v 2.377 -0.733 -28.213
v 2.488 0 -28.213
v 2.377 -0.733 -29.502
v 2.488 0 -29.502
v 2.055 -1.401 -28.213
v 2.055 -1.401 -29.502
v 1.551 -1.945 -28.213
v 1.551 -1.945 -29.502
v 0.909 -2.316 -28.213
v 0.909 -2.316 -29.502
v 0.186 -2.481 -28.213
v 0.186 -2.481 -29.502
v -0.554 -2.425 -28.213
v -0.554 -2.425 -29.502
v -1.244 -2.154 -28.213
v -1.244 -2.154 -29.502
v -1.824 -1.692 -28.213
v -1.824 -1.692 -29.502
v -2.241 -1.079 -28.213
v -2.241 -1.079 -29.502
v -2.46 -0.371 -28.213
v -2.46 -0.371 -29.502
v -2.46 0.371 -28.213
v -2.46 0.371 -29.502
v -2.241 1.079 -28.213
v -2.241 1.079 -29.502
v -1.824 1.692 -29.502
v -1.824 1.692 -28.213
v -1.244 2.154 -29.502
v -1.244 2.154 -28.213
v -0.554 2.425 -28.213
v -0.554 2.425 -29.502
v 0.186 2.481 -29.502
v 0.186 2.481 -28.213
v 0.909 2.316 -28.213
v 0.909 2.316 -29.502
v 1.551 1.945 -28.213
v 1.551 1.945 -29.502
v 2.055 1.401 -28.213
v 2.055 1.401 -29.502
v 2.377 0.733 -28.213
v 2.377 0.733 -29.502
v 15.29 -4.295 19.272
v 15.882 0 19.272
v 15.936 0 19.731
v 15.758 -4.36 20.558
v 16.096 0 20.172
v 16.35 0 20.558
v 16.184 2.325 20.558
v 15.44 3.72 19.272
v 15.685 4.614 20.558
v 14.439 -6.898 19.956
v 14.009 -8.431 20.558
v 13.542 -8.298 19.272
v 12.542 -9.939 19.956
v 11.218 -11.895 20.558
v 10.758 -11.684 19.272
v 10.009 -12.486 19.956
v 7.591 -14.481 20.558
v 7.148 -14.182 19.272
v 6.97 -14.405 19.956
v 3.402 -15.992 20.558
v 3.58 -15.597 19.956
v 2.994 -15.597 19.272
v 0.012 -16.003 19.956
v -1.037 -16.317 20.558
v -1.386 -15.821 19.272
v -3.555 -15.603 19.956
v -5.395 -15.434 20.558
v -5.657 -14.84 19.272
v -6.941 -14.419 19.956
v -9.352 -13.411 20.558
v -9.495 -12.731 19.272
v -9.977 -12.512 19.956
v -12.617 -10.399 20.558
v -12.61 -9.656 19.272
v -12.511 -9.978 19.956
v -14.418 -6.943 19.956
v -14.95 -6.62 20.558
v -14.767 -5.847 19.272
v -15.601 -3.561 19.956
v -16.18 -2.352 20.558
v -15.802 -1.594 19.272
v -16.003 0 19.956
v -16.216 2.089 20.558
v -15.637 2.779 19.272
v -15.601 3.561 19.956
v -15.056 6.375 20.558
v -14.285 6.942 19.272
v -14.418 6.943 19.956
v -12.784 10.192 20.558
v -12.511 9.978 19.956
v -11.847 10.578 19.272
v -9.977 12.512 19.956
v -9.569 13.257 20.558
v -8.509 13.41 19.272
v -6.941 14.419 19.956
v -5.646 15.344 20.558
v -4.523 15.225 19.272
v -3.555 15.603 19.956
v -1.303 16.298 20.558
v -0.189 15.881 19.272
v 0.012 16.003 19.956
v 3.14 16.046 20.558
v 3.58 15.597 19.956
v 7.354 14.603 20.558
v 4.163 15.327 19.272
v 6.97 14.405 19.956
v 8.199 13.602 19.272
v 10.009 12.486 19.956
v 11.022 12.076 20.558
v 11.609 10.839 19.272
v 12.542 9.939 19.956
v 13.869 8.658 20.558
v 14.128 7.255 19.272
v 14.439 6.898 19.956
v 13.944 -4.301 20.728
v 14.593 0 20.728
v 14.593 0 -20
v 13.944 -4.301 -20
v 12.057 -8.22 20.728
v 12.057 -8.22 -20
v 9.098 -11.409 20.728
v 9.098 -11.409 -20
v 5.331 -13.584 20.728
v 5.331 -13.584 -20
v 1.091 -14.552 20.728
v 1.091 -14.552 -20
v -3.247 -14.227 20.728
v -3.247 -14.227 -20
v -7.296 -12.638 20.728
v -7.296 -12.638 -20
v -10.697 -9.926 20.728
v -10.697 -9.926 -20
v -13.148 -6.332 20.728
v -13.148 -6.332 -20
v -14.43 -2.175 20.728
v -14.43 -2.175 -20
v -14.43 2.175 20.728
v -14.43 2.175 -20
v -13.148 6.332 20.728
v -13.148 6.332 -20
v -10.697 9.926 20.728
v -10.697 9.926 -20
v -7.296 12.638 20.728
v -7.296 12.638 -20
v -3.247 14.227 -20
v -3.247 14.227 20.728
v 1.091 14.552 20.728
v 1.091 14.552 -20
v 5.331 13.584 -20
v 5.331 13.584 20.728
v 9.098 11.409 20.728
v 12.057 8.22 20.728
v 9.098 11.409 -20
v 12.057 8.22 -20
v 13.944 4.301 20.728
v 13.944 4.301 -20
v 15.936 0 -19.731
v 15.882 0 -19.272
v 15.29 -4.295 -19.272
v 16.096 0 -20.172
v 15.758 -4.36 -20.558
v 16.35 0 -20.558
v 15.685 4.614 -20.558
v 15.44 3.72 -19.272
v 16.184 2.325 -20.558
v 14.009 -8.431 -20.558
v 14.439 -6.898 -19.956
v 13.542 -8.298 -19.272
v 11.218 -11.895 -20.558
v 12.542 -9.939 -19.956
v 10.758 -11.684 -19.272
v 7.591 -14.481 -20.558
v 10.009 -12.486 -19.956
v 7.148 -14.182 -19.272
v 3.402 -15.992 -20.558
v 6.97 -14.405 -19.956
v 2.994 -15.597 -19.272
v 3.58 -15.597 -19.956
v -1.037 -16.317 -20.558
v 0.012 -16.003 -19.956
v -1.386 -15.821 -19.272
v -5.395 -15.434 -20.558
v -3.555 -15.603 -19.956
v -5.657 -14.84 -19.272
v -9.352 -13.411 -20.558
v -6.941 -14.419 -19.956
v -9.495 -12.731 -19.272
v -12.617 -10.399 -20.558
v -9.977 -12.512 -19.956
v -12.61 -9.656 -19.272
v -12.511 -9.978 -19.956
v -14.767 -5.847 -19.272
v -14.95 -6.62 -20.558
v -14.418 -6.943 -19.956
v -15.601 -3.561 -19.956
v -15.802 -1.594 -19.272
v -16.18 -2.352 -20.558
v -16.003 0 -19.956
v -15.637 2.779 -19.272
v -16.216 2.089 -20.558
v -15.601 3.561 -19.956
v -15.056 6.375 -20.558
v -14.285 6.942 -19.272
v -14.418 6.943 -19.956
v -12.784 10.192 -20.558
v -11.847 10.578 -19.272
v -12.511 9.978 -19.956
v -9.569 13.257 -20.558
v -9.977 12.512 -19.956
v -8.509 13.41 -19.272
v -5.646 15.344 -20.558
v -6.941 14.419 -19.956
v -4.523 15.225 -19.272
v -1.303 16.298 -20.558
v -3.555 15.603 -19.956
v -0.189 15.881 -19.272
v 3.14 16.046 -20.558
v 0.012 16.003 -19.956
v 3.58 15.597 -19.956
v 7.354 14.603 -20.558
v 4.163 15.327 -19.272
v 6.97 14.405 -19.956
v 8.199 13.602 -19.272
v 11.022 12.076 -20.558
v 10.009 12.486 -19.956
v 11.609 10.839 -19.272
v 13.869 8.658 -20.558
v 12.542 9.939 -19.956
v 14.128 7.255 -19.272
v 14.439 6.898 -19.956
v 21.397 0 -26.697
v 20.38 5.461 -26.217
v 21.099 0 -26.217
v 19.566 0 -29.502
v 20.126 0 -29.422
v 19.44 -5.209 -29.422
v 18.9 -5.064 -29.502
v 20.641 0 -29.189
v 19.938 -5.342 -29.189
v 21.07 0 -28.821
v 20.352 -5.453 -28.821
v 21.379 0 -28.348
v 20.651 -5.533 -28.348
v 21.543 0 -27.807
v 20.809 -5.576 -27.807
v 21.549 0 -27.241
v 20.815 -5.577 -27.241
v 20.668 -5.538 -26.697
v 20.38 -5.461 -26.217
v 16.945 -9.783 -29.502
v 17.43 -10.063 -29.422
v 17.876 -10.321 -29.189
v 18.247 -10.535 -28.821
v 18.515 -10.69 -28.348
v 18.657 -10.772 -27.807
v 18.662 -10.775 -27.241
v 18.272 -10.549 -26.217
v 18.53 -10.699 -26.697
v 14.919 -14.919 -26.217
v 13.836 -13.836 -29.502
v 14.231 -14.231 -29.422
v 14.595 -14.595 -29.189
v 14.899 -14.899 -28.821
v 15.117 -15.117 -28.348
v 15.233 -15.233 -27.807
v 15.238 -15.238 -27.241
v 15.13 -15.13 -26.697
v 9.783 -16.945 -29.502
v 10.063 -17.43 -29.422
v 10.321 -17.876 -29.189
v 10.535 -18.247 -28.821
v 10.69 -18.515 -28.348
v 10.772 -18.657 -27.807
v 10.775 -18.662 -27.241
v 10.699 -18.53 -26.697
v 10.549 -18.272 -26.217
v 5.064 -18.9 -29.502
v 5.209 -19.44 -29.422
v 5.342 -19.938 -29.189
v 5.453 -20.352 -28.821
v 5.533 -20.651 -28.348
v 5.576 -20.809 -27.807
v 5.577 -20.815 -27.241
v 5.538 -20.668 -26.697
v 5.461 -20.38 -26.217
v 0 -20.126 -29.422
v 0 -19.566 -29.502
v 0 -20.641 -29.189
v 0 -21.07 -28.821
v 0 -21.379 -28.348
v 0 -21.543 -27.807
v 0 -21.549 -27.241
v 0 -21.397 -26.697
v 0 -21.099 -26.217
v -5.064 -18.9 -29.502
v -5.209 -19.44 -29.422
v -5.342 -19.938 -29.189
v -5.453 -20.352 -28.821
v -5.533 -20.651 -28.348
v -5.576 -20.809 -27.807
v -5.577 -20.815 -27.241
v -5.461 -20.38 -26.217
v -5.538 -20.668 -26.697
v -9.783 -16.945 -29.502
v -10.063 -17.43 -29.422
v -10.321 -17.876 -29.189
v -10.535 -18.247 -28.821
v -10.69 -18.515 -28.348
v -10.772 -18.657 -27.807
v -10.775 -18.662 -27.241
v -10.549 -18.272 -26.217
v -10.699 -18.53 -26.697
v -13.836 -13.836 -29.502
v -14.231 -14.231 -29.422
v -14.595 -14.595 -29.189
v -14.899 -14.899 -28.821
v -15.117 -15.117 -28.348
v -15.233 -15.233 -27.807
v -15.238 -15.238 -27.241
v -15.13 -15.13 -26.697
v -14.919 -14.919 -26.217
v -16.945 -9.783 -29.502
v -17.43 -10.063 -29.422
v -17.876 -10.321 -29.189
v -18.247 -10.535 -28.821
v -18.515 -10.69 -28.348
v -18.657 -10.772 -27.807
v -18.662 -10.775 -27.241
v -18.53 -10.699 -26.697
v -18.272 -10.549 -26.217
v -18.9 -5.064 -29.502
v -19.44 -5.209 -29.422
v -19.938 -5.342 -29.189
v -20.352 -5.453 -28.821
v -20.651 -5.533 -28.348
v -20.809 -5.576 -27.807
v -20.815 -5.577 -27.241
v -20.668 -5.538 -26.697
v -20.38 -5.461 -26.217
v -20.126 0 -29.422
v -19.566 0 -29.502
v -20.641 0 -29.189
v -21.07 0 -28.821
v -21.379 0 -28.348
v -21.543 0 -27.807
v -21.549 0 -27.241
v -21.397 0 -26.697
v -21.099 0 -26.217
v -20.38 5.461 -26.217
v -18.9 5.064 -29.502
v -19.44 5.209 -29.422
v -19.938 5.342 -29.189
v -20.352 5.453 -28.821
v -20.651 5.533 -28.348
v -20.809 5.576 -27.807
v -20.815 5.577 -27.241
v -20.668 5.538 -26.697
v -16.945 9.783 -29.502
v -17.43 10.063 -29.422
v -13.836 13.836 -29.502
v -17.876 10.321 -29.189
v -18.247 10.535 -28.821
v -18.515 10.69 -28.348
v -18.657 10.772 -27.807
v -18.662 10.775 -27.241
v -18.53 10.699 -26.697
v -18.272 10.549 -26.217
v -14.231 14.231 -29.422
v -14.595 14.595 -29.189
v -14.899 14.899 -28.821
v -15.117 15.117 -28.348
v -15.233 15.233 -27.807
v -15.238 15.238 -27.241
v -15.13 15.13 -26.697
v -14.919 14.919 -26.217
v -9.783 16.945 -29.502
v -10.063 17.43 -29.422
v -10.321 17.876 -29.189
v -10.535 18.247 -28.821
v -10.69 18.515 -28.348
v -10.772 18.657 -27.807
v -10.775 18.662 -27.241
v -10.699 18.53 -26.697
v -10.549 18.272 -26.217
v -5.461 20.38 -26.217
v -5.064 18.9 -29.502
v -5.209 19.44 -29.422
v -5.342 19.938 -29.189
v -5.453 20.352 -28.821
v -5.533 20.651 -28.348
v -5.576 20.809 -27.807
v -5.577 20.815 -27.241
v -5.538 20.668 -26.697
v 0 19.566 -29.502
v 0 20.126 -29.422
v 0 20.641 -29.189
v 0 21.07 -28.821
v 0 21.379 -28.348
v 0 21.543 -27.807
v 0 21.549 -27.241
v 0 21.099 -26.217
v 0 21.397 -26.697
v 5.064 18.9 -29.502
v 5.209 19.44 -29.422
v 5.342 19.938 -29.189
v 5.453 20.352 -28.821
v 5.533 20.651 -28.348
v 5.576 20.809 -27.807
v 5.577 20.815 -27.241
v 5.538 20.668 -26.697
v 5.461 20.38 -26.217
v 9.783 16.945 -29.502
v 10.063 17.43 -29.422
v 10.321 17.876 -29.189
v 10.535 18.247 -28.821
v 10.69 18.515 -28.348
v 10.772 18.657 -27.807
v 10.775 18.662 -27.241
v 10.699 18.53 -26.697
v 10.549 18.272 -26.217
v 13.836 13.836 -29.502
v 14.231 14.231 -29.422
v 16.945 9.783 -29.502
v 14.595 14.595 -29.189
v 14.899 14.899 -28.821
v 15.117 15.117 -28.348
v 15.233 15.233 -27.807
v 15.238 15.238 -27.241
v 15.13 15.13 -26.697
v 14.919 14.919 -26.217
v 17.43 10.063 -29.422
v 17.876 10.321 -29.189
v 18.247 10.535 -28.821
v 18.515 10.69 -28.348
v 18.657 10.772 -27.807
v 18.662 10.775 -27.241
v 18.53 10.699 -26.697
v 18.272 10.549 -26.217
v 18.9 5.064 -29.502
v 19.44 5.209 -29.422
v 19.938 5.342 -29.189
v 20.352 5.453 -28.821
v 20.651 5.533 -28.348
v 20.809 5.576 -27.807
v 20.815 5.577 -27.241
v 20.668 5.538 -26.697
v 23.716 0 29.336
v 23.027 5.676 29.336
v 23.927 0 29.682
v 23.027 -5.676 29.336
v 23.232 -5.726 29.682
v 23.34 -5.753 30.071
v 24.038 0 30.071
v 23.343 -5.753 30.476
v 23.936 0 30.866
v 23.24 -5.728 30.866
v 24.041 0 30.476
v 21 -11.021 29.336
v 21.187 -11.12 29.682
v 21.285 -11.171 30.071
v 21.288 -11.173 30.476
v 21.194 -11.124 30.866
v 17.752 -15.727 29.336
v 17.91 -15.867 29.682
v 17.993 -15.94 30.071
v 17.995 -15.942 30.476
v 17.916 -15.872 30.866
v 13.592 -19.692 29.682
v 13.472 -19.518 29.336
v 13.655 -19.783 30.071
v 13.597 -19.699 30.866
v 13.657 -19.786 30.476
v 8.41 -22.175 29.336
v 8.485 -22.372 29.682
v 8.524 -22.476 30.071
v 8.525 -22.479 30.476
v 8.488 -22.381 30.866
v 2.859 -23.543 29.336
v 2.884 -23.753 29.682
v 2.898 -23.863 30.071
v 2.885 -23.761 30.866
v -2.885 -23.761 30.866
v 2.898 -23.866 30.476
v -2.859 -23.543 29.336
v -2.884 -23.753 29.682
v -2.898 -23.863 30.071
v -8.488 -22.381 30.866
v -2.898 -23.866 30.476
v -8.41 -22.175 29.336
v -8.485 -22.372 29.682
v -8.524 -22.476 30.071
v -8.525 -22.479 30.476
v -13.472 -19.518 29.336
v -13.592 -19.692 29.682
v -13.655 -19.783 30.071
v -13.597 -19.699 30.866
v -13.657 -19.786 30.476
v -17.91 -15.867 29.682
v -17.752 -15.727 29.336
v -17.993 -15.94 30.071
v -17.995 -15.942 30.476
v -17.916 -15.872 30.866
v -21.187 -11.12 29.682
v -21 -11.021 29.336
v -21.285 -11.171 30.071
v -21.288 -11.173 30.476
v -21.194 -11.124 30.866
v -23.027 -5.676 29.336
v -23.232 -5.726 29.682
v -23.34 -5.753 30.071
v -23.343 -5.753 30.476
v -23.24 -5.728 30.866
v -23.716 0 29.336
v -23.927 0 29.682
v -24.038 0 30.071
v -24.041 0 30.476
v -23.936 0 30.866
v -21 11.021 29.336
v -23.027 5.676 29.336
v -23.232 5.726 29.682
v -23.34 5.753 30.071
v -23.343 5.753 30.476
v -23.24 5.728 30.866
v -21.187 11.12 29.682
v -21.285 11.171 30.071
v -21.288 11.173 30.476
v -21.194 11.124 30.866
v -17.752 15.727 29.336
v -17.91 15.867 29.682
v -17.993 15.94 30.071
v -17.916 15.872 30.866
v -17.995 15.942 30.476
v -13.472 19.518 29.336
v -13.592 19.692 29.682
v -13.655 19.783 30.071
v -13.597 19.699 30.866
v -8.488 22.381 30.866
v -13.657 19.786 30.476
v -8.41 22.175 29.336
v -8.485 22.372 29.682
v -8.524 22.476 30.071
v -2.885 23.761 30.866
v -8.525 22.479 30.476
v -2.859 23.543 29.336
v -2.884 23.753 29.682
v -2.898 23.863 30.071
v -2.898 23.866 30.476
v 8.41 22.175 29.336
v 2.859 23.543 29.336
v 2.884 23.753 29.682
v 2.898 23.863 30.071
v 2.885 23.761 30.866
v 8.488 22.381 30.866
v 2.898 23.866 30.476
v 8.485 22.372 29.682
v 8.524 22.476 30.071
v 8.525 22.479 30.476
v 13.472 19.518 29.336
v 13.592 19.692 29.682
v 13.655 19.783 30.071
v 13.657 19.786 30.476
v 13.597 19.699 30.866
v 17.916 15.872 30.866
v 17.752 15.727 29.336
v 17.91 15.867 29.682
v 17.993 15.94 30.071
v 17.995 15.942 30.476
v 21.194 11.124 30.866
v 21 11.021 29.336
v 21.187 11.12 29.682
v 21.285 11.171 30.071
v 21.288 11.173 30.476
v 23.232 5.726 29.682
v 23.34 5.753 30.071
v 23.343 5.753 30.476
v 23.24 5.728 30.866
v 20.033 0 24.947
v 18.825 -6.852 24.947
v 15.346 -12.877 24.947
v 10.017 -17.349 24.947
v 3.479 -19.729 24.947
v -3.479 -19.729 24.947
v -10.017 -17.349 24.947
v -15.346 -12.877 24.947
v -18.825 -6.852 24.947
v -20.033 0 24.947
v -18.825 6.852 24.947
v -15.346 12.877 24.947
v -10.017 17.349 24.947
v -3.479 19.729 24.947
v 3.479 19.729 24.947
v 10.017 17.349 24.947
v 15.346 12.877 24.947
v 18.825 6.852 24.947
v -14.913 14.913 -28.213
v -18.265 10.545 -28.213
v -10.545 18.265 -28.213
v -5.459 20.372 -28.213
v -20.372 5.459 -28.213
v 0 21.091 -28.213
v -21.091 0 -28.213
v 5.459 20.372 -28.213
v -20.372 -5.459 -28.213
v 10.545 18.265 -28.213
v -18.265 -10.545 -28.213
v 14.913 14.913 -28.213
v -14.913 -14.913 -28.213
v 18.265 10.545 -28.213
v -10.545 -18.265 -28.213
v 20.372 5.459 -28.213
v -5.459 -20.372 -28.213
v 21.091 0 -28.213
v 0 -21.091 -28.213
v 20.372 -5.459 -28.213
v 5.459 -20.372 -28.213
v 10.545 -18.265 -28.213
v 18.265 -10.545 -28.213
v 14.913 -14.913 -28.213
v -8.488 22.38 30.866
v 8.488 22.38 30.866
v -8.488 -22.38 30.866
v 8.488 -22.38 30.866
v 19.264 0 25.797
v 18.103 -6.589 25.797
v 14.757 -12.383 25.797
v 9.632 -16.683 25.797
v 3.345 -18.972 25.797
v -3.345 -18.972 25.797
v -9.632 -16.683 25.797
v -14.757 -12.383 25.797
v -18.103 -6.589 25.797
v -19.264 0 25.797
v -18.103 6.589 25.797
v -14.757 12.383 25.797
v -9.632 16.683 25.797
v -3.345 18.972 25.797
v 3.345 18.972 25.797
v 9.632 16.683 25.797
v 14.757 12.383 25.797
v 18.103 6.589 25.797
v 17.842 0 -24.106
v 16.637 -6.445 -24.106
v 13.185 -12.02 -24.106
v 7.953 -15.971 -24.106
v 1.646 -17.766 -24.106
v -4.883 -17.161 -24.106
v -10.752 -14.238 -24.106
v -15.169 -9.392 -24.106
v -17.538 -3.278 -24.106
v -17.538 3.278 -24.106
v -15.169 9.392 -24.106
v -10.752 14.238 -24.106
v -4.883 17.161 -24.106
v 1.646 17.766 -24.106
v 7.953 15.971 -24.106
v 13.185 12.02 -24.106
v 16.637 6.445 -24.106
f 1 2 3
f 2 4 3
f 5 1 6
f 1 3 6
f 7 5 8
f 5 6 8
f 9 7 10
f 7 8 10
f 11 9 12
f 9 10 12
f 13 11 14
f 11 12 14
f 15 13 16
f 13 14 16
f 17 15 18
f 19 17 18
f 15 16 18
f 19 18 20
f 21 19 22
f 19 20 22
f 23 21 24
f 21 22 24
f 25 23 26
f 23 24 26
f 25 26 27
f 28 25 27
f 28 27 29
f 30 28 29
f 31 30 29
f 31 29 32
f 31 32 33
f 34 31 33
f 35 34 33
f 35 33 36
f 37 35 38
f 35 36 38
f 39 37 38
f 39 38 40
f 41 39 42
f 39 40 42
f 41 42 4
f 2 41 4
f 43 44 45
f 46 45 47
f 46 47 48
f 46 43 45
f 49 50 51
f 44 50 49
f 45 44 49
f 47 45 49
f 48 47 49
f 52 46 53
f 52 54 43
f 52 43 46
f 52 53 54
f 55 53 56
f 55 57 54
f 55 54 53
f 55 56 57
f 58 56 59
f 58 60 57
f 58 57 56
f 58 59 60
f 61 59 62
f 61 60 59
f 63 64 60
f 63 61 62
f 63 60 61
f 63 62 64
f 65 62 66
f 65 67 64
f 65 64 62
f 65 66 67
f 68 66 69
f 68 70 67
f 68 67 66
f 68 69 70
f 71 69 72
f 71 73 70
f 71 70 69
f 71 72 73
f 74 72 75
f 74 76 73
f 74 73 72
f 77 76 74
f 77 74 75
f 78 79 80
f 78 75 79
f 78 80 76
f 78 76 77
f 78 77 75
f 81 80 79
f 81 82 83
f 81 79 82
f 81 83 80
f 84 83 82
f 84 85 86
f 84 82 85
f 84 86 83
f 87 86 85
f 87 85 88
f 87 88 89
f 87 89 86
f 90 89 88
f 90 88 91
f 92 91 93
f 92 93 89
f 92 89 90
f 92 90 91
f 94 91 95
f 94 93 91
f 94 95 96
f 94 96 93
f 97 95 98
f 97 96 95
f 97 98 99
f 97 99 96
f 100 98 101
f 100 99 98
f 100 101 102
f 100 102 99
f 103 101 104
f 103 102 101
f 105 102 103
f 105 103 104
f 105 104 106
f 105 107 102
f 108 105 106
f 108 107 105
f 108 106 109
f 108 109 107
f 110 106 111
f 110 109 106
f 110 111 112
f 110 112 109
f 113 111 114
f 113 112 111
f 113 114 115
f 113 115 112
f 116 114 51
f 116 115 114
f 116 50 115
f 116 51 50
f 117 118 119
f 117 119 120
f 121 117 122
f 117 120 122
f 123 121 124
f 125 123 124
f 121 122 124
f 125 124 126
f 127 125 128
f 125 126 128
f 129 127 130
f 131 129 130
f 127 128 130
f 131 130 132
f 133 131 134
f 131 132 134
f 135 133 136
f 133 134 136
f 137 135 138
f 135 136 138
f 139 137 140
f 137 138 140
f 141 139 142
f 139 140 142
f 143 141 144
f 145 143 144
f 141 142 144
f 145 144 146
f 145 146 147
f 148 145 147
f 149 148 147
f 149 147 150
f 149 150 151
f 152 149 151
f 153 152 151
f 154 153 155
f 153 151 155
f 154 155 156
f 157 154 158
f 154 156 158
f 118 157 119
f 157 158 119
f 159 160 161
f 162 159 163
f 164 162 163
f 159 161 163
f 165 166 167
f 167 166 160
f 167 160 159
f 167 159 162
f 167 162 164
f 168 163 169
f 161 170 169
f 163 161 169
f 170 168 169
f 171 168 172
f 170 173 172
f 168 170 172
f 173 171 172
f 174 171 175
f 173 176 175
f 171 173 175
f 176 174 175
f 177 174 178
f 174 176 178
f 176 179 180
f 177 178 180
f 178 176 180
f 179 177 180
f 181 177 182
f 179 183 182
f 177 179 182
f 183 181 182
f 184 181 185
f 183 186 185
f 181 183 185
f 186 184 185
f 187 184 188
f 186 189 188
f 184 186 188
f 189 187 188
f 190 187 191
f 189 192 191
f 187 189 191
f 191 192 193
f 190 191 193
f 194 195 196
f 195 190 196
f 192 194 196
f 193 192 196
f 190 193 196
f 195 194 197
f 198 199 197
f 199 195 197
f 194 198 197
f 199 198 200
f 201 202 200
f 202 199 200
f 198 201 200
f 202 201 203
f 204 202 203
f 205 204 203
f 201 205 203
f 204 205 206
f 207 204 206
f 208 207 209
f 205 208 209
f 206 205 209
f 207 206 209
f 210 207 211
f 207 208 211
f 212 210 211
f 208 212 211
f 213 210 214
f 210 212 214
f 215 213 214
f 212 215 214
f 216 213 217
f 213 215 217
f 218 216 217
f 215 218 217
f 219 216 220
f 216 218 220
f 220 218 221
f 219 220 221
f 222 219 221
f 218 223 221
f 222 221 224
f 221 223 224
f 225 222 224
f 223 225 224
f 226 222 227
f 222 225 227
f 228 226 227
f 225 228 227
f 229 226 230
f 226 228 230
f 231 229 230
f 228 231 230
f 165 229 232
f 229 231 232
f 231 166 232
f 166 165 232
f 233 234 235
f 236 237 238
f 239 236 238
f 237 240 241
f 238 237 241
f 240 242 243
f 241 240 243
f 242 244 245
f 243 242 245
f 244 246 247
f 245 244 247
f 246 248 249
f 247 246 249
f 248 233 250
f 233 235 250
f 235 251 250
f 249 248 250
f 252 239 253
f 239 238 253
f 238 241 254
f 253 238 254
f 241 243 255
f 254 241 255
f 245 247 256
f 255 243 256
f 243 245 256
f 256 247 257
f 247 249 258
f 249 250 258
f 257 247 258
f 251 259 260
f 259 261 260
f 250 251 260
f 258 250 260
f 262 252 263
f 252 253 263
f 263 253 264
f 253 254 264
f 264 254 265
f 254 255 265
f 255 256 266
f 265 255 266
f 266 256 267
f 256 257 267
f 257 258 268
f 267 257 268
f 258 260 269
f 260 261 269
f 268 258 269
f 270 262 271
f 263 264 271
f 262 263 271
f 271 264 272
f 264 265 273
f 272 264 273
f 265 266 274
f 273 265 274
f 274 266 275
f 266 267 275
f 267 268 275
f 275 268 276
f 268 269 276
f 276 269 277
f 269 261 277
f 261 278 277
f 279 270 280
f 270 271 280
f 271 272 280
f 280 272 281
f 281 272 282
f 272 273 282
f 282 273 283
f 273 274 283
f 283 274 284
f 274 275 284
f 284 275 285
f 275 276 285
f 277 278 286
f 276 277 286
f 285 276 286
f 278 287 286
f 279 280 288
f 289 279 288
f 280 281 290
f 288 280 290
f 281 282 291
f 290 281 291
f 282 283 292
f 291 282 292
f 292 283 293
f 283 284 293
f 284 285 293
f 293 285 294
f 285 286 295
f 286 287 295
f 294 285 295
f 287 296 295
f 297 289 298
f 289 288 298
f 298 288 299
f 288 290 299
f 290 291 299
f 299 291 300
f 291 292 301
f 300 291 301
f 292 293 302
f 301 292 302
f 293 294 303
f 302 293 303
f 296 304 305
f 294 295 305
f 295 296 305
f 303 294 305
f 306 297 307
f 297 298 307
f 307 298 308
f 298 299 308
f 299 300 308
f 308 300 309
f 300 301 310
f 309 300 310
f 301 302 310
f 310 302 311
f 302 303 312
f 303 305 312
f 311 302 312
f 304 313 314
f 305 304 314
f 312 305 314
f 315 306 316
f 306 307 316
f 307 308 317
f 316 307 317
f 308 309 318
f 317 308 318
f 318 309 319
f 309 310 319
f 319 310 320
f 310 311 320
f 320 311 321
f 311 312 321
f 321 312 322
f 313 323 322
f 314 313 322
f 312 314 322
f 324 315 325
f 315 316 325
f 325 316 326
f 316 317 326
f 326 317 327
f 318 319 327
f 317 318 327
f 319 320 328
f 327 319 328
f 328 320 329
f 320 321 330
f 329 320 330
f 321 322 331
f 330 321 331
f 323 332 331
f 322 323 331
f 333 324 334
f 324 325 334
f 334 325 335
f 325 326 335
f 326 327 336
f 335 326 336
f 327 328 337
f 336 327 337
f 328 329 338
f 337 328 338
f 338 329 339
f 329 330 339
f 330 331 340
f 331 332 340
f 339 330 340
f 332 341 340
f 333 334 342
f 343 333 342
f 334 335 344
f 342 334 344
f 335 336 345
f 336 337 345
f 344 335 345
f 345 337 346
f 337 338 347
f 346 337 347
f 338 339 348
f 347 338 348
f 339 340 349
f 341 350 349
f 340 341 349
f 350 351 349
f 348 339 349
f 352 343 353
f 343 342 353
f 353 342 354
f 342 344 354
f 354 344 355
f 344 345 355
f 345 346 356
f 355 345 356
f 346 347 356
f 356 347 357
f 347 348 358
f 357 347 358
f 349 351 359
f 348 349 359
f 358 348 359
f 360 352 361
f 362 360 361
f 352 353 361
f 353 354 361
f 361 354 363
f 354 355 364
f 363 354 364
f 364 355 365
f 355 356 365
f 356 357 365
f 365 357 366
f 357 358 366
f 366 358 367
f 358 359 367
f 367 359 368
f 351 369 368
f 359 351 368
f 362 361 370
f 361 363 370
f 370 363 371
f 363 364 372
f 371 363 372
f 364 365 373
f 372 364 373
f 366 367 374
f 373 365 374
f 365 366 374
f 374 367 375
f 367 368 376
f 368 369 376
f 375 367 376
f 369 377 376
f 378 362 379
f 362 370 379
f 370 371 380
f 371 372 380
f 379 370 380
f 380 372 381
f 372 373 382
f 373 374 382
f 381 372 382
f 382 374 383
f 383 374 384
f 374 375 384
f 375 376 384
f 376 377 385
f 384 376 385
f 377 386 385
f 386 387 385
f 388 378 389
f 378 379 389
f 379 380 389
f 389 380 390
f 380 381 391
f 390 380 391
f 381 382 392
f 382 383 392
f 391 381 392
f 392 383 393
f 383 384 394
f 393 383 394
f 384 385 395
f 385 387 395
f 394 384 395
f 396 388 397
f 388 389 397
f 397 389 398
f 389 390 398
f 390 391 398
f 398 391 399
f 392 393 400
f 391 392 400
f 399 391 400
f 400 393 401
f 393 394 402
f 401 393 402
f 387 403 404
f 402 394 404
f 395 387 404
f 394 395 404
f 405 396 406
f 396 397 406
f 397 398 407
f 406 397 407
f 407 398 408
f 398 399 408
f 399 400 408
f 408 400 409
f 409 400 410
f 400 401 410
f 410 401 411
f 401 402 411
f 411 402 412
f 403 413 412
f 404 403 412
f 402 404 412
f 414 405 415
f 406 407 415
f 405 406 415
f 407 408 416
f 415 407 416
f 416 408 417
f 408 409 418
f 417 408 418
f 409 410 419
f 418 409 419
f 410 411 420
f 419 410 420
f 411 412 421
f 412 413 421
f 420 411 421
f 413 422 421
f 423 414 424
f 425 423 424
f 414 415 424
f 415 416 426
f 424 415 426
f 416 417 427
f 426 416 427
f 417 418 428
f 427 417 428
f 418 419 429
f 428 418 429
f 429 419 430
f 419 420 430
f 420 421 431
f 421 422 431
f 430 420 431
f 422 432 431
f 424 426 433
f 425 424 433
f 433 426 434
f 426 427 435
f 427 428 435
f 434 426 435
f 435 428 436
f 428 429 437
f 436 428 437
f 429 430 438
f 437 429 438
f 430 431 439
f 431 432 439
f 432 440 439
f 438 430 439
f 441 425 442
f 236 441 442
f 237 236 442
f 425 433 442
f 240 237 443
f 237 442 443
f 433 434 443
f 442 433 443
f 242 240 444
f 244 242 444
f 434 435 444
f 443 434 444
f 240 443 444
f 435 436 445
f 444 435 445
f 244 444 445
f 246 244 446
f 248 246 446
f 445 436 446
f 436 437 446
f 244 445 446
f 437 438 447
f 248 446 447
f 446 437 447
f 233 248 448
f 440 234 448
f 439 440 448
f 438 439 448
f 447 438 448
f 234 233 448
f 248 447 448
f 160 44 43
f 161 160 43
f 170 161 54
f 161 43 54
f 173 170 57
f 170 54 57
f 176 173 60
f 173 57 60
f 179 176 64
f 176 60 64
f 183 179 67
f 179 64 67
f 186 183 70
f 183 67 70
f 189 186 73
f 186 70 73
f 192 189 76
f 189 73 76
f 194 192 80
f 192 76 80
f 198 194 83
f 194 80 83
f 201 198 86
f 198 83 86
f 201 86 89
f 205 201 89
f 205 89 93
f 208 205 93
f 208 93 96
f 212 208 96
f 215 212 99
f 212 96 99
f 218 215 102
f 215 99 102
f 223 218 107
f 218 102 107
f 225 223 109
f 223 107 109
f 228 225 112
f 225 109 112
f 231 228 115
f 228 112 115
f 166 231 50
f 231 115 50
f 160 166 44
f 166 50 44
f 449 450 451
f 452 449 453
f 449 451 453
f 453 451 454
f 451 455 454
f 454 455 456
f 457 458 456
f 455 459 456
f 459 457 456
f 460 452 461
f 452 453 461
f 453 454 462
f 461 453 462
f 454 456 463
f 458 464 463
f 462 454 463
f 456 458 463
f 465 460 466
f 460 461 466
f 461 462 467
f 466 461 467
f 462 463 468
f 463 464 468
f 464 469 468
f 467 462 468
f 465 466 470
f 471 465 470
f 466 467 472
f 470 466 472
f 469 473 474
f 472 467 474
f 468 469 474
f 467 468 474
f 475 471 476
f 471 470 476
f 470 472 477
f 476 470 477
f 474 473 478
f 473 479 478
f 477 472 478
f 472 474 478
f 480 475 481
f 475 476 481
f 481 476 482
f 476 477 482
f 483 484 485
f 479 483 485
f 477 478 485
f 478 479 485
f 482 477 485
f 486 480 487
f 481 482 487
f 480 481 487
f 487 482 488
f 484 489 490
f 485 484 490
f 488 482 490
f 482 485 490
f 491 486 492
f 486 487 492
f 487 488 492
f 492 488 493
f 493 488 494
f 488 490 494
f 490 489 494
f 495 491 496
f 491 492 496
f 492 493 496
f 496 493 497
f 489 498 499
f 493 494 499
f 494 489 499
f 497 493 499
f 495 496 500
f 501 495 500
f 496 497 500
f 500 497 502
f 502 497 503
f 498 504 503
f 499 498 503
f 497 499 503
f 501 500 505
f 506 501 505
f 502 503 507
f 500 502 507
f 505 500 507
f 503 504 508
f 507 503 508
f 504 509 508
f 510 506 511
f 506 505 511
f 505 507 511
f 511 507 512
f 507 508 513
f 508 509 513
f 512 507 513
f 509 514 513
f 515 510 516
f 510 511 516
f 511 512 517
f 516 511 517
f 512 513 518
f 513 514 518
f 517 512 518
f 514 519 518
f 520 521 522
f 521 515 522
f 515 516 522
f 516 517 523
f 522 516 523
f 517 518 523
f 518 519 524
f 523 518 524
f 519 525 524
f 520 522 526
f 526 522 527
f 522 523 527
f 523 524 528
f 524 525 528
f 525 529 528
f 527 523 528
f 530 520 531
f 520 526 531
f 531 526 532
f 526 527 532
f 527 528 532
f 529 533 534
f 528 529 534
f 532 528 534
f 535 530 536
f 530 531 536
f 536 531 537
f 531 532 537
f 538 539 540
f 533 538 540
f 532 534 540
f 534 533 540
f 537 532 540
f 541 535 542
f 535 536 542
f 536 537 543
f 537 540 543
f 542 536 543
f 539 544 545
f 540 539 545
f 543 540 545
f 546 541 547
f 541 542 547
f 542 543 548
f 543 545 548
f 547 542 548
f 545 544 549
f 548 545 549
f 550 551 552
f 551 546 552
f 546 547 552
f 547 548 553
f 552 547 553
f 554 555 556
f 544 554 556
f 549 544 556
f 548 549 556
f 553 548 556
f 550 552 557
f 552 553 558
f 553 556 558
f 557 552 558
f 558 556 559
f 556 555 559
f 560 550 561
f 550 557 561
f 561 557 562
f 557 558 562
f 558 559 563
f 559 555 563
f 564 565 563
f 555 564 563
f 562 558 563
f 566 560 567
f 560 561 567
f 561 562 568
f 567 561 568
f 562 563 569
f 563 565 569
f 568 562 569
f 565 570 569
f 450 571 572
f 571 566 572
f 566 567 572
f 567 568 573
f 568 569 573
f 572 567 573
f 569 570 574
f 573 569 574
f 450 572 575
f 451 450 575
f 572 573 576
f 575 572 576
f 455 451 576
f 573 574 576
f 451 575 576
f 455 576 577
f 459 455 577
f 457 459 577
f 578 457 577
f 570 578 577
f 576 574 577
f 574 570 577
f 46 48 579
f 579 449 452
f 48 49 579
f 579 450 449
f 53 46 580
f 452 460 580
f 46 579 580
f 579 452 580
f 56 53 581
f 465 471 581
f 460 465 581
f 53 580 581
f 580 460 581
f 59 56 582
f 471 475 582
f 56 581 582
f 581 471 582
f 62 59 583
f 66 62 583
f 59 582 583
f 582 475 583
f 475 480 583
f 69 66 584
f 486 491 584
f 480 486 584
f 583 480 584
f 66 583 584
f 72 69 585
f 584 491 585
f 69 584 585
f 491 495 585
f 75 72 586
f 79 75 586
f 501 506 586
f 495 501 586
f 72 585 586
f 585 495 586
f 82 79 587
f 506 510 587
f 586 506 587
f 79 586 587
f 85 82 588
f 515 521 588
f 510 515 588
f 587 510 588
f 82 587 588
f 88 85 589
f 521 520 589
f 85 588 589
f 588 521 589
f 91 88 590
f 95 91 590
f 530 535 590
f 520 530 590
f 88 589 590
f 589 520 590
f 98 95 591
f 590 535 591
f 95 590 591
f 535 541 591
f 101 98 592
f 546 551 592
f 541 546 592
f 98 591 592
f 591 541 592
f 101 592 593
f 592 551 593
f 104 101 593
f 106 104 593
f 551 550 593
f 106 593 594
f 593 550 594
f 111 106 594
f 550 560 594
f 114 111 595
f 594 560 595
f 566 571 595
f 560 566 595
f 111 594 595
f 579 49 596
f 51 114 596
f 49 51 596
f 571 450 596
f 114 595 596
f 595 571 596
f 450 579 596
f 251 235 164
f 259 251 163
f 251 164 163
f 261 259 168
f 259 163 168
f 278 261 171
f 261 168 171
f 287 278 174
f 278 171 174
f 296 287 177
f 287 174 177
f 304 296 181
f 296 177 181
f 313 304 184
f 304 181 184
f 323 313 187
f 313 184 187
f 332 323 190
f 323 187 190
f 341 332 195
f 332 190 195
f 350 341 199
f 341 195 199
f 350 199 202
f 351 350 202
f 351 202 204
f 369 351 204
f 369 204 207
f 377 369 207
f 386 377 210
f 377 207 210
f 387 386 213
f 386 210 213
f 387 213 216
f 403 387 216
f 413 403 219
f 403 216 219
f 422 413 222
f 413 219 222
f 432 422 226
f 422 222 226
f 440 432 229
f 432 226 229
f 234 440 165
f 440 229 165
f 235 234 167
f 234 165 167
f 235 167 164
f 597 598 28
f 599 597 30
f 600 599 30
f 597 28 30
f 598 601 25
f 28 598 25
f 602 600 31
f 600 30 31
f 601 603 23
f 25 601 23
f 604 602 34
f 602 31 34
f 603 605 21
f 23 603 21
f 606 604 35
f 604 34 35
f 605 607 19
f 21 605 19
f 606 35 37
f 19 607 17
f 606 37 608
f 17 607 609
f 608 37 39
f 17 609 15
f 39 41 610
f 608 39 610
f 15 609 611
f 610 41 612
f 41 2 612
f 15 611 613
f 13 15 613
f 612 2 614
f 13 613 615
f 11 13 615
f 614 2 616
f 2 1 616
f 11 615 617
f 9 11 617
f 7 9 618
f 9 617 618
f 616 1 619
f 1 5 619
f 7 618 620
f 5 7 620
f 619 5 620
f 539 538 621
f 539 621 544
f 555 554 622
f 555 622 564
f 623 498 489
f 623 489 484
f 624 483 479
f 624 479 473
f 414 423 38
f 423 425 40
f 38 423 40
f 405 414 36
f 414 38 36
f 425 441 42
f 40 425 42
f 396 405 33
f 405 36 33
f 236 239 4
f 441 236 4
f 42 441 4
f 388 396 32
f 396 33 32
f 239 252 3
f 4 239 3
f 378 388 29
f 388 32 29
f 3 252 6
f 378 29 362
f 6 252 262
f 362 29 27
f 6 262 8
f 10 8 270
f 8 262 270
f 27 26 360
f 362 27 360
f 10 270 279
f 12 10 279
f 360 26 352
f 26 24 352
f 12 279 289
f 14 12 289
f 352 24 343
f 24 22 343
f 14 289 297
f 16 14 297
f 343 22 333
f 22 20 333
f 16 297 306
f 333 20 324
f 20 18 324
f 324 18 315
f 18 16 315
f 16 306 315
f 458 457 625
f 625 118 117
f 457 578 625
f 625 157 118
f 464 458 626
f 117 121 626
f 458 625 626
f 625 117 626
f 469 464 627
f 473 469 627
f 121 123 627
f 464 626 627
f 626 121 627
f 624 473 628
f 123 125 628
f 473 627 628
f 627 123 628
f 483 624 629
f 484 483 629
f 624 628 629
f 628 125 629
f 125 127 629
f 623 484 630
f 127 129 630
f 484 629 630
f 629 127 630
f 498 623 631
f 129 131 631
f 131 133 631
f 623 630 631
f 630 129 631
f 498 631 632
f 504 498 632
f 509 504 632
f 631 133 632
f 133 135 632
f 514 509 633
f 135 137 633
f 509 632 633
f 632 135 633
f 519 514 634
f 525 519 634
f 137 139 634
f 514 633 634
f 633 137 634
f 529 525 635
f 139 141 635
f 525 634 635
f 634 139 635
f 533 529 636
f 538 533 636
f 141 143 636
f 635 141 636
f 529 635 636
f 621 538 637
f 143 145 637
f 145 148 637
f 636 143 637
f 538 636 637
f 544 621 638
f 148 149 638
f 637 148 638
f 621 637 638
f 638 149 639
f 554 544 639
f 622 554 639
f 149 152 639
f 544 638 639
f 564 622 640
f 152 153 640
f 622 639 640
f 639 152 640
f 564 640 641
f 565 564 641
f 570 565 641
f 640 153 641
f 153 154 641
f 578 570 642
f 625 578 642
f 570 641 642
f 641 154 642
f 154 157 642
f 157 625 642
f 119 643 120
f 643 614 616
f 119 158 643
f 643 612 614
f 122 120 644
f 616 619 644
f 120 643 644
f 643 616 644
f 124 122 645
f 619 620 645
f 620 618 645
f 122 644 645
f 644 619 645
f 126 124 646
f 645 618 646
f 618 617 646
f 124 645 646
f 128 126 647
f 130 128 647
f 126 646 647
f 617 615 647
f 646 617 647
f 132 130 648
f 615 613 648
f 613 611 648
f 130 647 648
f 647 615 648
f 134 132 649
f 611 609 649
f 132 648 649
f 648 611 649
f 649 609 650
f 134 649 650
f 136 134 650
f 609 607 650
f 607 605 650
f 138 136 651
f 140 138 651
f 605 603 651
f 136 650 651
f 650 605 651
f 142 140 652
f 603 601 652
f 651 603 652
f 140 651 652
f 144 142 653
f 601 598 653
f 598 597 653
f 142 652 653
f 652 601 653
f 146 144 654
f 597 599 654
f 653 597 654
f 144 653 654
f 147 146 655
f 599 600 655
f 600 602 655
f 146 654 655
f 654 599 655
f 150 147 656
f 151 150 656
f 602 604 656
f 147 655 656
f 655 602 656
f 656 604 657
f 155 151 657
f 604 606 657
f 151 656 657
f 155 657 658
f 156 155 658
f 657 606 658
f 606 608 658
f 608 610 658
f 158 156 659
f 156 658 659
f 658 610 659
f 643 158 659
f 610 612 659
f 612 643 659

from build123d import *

# Parameters (mm, degrees)
F2_R = 2


# Not quite as in the source:
# - a fillet or chamfer that OpenCascade refuses, or shapes differently, is made with other operations: its cross-section is extruded or revolved along the edge and cut away or added


with BuildPart() as f1:
    # F0 (on Front) → F1 (revolve)
    with BuildSketch(Plane.XZ):
        Polygon((15.8820929868, -20), (15.8820929868, 0), (15.8820929868, 20), (25, 30.8662984399), (23.9358222275, 30.8662984399), (14.5927630612, 20.7279404685), (14.5927630612, 0.3639702343), (14.5927630612, -20), (21.0905159717, -28.2129982056), (2.4876487441, -28.2129982056), (2.4876487441, -29.5023282056), (22.5661631538, -29.5023282056), (23.8554930795, -29.5023282056), align=None)
    revolve(axis=Axis((0, 0, 0), (0, 0, -1)))

    # F2
    f2_edges = [f1.edges().sort_by_distance(p)[0] for p in [
        (-15.882093, 0, -20),
        (-15.882093, 0, 20),
        (-23.855493, 0, -29.502328),
    ]]
    fillet(f2_edges, radius=F2_R)

    # F3: fillet of radius 1.5 on 1 edges, made by hand

    # F3_s1 → F3_t2 (revolve, cut)
    with BuildSketch(Plane.XZ):
        with BuildLine():
            ThreePointArc((23.7026404335, 29.319932157), (24.0367869093, 30.060330686), (23.9359604662, 30.8663566642))
            Line((23.9359604662, 30.8663566642), (23.9636082001, 30.878001526))
            ThreePointArc((23.9636082001, 30.878001526), (24.4679802331, 30.8962984399), (25, 30.8962984399))
            Line((25, 30.8962984399), (25.0229813333, 30.8470148116))
            ThreePointArc((25.0229813333, 30.8470148116), (24.3742440967, 30.0738798792), (23.7256217668, 29.3006485287))
            Line((23.7256217668, 29.3006485287), (23.7026404335, 29.319932157))
        make_face()
    revolve(axis=Axis((0, 0, 30.8662984399), (0, 0, -1)), mode=Mode.SUBTRACT)


solid = f1.part
